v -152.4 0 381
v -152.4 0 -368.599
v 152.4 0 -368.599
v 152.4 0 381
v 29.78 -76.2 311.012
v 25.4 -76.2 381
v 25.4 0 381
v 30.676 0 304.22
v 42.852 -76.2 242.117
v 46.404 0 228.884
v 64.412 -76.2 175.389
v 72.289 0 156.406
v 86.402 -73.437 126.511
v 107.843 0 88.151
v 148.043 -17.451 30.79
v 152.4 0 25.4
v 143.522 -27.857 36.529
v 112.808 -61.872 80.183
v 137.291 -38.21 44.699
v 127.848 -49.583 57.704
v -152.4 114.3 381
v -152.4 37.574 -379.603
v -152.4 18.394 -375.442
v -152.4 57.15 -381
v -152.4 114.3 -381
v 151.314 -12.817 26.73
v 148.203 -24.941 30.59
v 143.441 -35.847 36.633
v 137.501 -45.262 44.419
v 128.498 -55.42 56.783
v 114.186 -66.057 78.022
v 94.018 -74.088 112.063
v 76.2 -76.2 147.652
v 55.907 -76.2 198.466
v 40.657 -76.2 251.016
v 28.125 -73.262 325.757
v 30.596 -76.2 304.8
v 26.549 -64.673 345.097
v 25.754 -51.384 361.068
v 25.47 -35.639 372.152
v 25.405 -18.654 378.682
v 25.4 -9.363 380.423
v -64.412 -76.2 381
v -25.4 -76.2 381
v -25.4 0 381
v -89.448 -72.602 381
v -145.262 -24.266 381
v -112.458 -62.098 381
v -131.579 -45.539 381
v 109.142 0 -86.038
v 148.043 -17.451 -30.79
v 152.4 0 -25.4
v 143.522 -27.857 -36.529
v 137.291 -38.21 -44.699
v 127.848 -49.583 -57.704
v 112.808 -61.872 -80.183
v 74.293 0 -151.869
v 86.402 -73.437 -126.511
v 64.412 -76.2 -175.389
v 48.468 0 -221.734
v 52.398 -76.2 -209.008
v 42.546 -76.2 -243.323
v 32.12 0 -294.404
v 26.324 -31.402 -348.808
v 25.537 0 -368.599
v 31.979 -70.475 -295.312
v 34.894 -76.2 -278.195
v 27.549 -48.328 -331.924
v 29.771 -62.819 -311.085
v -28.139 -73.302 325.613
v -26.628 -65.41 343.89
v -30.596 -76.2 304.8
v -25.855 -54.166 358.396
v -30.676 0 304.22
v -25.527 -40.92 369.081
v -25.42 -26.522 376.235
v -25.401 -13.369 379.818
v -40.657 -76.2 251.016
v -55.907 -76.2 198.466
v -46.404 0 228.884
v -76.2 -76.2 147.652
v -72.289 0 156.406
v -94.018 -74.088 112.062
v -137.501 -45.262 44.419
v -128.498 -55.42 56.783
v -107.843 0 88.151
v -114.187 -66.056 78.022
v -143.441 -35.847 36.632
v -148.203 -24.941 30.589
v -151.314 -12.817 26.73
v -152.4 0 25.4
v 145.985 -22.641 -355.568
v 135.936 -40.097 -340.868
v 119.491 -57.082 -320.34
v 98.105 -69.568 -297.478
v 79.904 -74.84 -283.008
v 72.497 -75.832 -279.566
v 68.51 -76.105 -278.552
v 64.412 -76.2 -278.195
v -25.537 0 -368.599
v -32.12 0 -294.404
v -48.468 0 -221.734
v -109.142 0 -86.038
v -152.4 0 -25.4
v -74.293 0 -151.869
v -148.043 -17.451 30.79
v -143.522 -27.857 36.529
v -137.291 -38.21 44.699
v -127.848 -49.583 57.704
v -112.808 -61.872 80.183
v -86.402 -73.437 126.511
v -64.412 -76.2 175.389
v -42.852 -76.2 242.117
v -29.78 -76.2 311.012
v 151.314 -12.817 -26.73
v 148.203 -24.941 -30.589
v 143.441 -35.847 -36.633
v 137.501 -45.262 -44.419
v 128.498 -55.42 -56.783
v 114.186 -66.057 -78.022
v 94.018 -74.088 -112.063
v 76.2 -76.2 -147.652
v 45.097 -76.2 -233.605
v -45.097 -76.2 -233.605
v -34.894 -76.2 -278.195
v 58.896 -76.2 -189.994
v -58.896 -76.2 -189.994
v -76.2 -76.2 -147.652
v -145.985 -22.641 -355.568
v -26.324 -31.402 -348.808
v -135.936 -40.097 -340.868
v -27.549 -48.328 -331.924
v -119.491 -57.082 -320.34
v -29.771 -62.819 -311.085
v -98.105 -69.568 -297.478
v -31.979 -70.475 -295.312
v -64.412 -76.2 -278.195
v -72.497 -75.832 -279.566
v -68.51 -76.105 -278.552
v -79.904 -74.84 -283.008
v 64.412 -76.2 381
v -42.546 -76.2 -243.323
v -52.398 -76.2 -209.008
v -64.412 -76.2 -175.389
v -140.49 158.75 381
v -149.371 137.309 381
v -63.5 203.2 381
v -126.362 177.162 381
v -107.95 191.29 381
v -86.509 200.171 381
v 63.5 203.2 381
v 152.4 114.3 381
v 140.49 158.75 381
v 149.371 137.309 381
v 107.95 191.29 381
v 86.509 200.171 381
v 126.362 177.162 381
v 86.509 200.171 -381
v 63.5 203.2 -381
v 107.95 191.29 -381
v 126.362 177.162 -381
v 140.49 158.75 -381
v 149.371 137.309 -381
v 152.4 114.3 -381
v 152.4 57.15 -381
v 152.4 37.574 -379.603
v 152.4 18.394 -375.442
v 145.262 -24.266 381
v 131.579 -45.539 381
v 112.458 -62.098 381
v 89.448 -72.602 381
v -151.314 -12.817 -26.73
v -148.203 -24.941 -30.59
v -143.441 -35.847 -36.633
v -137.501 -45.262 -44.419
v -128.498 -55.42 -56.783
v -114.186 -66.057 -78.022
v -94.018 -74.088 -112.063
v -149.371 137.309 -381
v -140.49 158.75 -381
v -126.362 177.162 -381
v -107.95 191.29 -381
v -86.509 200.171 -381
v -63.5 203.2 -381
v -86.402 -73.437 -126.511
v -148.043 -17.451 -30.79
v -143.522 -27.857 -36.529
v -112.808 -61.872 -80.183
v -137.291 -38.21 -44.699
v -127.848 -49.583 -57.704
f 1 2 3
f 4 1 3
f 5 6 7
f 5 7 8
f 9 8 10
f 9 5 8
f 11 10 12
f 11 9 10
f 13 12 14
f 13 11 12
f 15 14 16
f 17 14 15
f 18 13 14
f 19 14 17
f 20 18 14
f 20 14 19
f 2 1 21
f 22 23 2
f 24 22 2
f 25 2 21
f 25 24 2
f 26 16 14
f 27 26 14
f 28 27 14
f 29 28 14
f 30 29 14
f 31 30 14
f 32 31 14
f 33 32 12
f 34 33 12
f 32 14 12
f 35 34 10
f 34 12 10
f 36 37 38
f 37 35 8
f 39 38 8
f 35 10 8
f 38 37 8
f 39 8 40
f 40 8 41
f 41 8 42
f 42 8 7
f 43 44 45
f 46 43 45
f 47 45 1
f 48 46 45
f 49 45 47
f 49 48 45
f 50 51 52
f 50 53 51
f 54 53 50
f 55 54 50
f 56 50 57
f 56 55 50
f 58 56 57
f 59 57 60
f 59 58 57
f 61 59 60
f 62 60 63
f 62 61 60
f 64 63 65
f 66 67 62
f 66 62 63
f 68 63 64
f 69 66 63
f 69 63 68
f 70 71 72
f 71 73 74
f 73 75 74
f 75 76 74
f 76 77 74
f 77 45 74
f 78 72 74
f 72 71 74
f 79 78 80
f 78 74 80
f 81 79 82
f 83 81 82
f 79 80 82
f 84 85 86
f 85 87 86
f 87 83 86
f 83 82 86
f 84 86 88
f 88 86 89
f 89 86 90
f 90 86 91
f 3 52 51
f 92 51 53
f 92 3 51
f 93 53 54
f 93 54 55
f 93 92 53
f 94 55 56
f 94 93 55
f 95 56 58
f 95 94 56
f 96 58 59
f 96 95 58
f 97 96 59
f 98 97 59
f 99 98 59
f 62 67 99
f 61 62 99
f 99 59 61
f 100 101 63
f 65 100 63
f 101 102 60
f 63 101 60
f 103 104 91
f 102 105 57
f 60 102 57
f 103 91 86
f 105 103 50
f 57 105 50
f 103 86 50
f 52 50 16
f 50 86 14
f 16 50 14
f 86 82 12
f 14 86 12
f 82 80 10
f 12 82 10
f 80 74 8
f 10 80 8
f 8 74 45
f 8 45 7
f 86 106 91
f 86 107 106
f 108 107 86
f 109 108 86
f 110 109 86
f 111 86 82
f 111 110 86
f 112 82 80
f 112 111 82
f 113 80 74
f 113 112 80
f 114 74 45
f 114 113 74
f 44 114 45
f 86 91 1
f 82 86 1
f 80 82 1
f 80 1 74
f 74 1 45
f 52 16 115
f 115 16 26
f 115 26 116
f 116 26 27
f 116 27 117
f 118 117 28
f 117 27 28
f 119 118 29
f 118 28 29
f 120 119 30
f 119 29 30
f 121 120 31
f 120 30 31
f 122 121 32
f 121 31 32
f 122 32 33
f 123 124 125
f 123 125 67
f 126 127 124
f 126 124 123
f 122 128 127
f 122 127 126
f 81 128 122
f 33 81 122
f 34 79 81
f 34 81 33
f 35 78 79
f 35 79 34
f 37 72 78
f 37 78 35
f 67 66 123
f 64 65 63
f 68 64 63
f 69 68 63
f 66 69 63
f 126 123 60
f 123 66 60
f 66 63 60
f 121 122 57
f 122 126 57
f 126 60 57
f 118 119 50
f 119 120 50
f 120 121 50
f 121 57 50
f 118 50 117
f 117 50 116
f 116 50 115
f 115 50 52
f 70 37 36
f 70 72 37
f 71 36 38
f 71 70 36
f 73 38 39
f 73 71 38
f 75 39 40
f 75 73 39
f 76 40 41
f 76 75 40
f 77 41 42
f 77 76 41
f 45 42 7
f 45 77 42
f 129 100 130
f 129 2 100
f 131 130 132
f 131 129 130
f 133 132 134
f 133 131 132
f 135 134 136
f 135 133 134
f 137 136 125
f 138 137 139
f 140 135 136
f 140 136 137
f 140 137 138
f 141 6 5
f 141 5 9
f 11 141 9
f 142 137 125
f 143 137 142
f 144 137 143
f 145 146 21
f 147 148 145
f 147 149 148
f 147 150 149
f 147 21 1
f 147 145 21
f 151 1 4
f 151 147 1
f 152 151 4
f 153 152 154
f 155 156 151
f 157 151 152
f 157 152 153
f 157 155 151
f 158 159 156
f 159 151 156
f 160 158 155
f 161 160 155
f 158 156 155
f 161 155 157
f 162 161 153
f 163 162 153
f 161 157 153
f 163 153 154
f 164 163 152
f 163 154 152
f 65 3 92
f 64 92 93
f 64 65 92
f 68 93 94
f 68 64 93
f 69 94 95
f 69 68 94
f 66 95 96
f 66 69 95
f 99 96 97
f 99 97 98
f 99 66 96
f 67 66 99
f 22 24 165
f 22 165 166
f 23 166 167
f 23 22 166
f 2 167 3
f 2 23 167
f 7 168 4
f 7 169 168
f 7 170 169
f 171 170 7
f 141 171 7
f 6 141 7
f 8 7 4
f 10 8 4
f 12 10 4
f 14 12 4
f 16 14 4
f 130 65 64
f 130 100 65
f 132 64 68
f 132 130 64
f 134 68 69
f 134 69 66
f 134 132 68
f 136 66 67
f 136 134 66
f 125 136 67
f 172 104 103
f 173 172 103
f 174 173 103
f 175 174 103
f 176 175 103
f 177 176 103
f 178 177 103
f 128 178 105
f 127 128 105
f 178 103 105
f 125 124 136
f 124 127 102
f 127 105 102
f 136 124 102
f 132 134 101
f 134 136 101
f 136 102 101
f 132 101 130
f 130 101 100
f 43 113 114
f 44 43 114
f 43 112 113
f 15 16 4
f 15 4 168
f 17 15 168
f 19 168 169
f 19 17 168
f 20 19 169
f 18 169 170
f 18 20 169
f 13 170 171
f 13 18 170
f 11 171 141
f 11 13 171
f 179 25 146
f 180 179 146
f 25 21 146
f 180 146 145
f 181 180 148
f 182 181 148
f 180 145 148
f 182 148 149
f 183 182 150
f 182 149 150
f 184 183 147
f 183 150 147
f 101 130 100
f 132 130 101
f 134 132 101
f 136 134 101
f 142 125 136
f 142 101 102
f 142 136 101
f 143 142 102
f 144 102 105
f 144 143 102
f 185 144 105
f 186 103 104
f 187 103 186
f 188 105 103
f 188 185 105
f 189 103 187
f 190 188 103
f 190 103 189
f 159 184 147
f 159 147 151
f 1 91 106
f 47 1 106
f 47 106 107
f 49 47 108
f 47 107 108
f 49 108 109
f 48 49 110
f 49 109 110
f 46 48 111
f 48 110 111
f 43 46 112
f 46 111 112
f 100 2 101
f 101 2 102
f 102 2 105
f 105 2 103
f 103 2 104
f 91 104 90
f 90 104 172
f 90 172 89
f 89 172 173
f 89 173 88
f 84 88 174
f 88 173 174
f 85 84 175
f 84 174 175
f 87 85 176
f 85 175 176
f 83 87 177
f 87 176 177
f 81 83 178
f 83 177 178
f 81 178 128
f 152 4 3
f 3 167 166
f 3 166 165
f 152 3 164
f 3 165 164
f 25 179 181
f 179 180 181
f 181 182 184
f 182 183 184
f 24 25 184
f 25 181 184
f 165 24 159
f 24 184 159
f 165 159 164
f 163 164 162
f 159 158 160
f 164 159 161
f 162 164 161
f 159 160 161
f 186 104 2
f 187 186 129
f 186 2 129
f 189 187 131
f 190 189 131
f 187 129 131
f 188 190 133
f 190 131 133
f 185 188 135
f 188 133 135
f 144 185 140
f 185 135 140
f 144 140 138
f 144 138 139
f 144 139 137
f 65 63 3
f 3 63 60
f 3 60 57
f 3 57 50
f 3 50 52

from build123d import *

# Parameters (mm, degrees)
F2_W           = 304.8
F2_H           = 203.2
F3_DEPTH       = 762
F7_DEPTH       = 76.2
F8_F1_R        = 88.9
F8_F2_R        = 88.9
F8_2_T1_DEPTH  = 795.5409051225
F8_3_T1_DEPTH  = 795.5409051225
F8_4_T1_DEPTH  = 795.5409051225
F8_5_T1_DEPTH  = 795.5409051225
F10_DEPTH      = 76.2
F11_R          = 76.19999
F12_R          = 76.19999
F14_DEPTH      = 152.4010001
F14_DEPTH_BACK = 152.4010001


# Not quite as in the source:
# - a fillet or chamfer that OpenCascade refuses, or shapes differently, is made with other operations: its cross-section is extruded or revolved along the edge and cut away or added
# - a fillet or chamfer is up to 0.001 mm smaller than in the source, because OpenCascade refuses the exact size


with BuildPart() as f3:
    # F2 (on plane+point) → F3 (new body, through all)
    with BuildSketch(Plane.XY.offset(-381)):
        with Locations((0, 101.6)):
            Rectangle(F2_W, F2_H)
    extrude(amount=F3_DEPTH)

    # F8: fillet of radius 88.9 on 2 edges, made by hand

    # F8_f1
    f8_f1_edges = [f3.edges().sort_by_distance(p)[0] for p in [
        (-152.4, 203.2, 0),
    ]]
    fillet(f8_f1_edges, radius=F8_F1_R)

    # F8_f2
    f8_f2_edges = [f3.edges().sort_by_distance(p)[0] for p in [
        (152.4, 203.2, 0),
    ]]
    fillet(f8_f2_edges, radius=F8_F2_R)


with BuildPart() as f7:
    # F6 (on plane+point) → F7 (new body, through all)
    with BuildSketch(Plane.XZ.offset(76.2)):
        with BuildLine():
            Line((-25.4, 381), (-152.4, 381))
            Line((-152.4, 381), (-152.4, 25.4))
            ThreePointArc((-152.4, 25.4), (-58.1025953454, 192.2009269091), (-25.4, 381))
        make_face()
    extrude(amount=-F7_DEPTH)

    # F8#2: fillet of radius 88.9 on 1 edges, made by hand

    # F8_2_s2 → F8_2_t1 (cut)
    with BuildSketch(Plane.XY.offset(-194.5704525613)):
        with BuildLine():
            ThreePointArc((-152.4, 0), (-122.6105303014, -54.502083301), (-64.4118189755, -76.2))
            Line((-64.4118189755, -76.2), (-152.4, -76.2))
            Line((-152.4, -76.2), (-152.4, 0))
        make_face()
    extrude(amount=F8_2_T1_DEPTH, mode=Mode.SUBTRACT)


with BuildPart() as f7b:
    # F6 (on plane+point) → F7, piece 2 (new body, through all)
    with BuildSketch(Plane.XZ.offset(76.2)):
        with BuildLine():
            Line((152.4, 25.4), (152.4, 381))
            Line((152.4, 381), (25.4, 381))
            ThreePointArc((25.4, 381), (58.1025953454, 192.2009269091), (152.4, 25.4))
        make_face()
    extrude(amount=-F7_DEPTH)

    # F8#3: fillet of radius 88.9 on 1 edges, made by hand

    # F8_3_s2 → F8_3_t1 (cut)
    with BuildSketch(Plane.XY.offset(-194.5704525613)):
        with BuildLine():
            ThreePointArc((152.4, 0), (122.6105303014, -54.502083301), (64.4118189755, -76.2))
            Line((64.4118189755, -76.2), (152.4, -76.2))
            Line((152.4, -76.2), (152.4, 0))
        make_face()
    extrude(amount=F8_3_T1_DEPTH, mode=Mode.SUBTRACT)


with BuildPart() as f7c:
    # F6 (on plane+point) → F7, piece 3 (new body, through all)
    with BuildSketch(Plane.XZ.offset(76.2)):
        with BuildLine():
            Line((25.4, -381), (152.4, -381))
            Line((152.4, -381), (152.4, -25.4))
            ThreePointArc((152.4, -25.4), (58.1025953454, -192.2009269091), (25.4, -381))
        make_face()
    extrude(amount=-F7_DEPTH)

    # F8#4: fillet of radius 88.9 on 1 edges, made by hand

    # F8_4_s2 → F8_4_t1 (cut)
    with BuildSketch(Plane.XY.offset(-600.9704525612)):
        with BuildLine():
            ThreePointArc((152.4, 0), (122.6105303014, -54.502083301), (64.4118189755, -76.2))
            Line((64.4118189755, -76.2), (152.4, -76.2))
            Line((152.4, -76.2), (152.4, 0))
        make_face()
    extrude(amount=F8_4_T1_DEPTH, mode=Mode.SUBTRACT)


with BuildPart() as f7d:
    # F6 (on plane+point) → F7, piece 4 (new body, through all)
    with BuildSketch(Plane.XZ.offset(76.2)):
        with BuildLine():
            Line((-152.4, -381), (-25.4, -381))
            ThreePointArc((-25.4, -381), (-58.1025953454, -192.2009269091), (-152.4, -25.4))
            Line((-152.4, -25.4), (-152.4, -381))
        make_face()
    extrude(amount=-F7_DEPTH)

    # F8#5: fillet of radius 88.9 on 1 edges, made by hand

    # F8_5_s2 → F8_5_t1 (cut)
    with BuildSketch(Plane.XY.offset(-600.9704525612)):
        with BuildLine():
            ThreePointArc((-152.4, 0), (-122.6105303014, -54.502083301), (-64.4118189755, -76.2))
            Line((-64.4118189755, -76.2), (-152.4, -76.2))
            Line((-152.4, -76.2), (-152.4, 0))
        make_face()
    extrude(amount=F8_5_T1_DEPTH, mode=Mode.SUBTRACT)


with BuildPart() as f10:
    # F9 (on face) → F10 (new body, through all)
    with BuildSketch(Plane.XZ):
        with BuildLine():
            ThreePointArc((-64.4118189755, 175.3890399136), (-102.5626769357, 96.9667001384), (-152.4, 25.4))
            Line((-152.4, 25.4), (-152.4, -25.4))
            ThreePointArc((-152.4, -25.4), (-102.5626769357, -96.9667001384), (-64.4118189755, -175.3890399136))
            ThreePointArc((-64.4118189755, -175.3890399136), (-35.2391855236, -276.3603935794), (-25.4, -381))
            Line((-25.4, -381), (25.4, -381))
            ThreePointArc((25.4, -381), (35.2391855236, -276.3603935794), (64.4118189755, -175.3890399136))
            ThreePointArc((64.4118189755, -175.3890399136), (102.5626769357, -96.9667001384), (152.4, -25.4))
            Line((152.4, -25.4), (152.4, 25.4))
            ThreePointArc((152.4, 25.4), (102.5626769357, 96.9667001384), (64.4118189755, 175.3890399136))
            ThreePointArc((64.4118189755, 175.3890399136), (35.2391855236, 276.3603935794), (25.4, 381))
            Line((25.4, 381), (-25.4, 381))
            ThreePointArc((-25.4, 381), (-35.2391855236, 276.3603935794), (-64.4118189755, 175.3890399136))
        make_face()
    extrude(amount=F10_DEPTH)

    # F11 (radius 76.2 in the source; OpenCascade refuses exactly that, so slightly less here)
    f11_edges = [f10.edges().sort_by_distance(p)[0] for p in [
        (-152.4, -76.2, 0),
        (152.4, -76.2, 0),
    ]]
    fillet(f11_edges, radius=F11_R)

    # F12 (radius 76.2 in the source; OpenCascade refuses exactly that, so slightly less here)
    f12_edges = [f10.edges().sort_by_distance(p)[0] for p in [
        (0, -76.2, 381),
    ]]
    fillet(f12_edges, radius=F12_R)


with BuildPart() as f14_tool:
    # F13 (on Right) → F14 (new body, two sides)
    with BuildSketch(Plane.YZ) as f14_sk:
        with BuildLine():
            ThreePointArc((57.15, -381), (-27.0390569298, -352.3149155996), (-76.2, -278.1945199568))
            Line((-76.2, -278.1945199568), (-76.2, -381))
            Line((-76.2, -381), (57.15, -381))
        make_face()
    extrude(amount=-F14_DEPTH)
    extrude(f14_sk.sketch, amount=F14_DEPTH_BACK)


with BuildPart() as f3_1:
    add(f3.part)

    # F14: cut by f14_tool
    add(f14_tool.part, mode=Mode.SUBTRACT)


with BuildPart() as f7c_1:
    add(f7c.part)

    # F14: cut by f14_tool
    add(f14_tool.part, mode=Mode.SUBTRACT)


with BuildPart() as f7d_1:
    add(f7d.part)

    # F14: cut by f14_tool
    add(f14_tool.part, mode=Mode.SUBTRACT)


with BuildPart() as f10_1:
    add(f10.part)

    # F14: cut by f14_tool
    add(f14_tool.part, mode=Mode.SUBTRACT)


solid = Compound([f7.part, f7b.part, f3_1.part, f7c_1.part, f7d_1.part, f10_1.part])
